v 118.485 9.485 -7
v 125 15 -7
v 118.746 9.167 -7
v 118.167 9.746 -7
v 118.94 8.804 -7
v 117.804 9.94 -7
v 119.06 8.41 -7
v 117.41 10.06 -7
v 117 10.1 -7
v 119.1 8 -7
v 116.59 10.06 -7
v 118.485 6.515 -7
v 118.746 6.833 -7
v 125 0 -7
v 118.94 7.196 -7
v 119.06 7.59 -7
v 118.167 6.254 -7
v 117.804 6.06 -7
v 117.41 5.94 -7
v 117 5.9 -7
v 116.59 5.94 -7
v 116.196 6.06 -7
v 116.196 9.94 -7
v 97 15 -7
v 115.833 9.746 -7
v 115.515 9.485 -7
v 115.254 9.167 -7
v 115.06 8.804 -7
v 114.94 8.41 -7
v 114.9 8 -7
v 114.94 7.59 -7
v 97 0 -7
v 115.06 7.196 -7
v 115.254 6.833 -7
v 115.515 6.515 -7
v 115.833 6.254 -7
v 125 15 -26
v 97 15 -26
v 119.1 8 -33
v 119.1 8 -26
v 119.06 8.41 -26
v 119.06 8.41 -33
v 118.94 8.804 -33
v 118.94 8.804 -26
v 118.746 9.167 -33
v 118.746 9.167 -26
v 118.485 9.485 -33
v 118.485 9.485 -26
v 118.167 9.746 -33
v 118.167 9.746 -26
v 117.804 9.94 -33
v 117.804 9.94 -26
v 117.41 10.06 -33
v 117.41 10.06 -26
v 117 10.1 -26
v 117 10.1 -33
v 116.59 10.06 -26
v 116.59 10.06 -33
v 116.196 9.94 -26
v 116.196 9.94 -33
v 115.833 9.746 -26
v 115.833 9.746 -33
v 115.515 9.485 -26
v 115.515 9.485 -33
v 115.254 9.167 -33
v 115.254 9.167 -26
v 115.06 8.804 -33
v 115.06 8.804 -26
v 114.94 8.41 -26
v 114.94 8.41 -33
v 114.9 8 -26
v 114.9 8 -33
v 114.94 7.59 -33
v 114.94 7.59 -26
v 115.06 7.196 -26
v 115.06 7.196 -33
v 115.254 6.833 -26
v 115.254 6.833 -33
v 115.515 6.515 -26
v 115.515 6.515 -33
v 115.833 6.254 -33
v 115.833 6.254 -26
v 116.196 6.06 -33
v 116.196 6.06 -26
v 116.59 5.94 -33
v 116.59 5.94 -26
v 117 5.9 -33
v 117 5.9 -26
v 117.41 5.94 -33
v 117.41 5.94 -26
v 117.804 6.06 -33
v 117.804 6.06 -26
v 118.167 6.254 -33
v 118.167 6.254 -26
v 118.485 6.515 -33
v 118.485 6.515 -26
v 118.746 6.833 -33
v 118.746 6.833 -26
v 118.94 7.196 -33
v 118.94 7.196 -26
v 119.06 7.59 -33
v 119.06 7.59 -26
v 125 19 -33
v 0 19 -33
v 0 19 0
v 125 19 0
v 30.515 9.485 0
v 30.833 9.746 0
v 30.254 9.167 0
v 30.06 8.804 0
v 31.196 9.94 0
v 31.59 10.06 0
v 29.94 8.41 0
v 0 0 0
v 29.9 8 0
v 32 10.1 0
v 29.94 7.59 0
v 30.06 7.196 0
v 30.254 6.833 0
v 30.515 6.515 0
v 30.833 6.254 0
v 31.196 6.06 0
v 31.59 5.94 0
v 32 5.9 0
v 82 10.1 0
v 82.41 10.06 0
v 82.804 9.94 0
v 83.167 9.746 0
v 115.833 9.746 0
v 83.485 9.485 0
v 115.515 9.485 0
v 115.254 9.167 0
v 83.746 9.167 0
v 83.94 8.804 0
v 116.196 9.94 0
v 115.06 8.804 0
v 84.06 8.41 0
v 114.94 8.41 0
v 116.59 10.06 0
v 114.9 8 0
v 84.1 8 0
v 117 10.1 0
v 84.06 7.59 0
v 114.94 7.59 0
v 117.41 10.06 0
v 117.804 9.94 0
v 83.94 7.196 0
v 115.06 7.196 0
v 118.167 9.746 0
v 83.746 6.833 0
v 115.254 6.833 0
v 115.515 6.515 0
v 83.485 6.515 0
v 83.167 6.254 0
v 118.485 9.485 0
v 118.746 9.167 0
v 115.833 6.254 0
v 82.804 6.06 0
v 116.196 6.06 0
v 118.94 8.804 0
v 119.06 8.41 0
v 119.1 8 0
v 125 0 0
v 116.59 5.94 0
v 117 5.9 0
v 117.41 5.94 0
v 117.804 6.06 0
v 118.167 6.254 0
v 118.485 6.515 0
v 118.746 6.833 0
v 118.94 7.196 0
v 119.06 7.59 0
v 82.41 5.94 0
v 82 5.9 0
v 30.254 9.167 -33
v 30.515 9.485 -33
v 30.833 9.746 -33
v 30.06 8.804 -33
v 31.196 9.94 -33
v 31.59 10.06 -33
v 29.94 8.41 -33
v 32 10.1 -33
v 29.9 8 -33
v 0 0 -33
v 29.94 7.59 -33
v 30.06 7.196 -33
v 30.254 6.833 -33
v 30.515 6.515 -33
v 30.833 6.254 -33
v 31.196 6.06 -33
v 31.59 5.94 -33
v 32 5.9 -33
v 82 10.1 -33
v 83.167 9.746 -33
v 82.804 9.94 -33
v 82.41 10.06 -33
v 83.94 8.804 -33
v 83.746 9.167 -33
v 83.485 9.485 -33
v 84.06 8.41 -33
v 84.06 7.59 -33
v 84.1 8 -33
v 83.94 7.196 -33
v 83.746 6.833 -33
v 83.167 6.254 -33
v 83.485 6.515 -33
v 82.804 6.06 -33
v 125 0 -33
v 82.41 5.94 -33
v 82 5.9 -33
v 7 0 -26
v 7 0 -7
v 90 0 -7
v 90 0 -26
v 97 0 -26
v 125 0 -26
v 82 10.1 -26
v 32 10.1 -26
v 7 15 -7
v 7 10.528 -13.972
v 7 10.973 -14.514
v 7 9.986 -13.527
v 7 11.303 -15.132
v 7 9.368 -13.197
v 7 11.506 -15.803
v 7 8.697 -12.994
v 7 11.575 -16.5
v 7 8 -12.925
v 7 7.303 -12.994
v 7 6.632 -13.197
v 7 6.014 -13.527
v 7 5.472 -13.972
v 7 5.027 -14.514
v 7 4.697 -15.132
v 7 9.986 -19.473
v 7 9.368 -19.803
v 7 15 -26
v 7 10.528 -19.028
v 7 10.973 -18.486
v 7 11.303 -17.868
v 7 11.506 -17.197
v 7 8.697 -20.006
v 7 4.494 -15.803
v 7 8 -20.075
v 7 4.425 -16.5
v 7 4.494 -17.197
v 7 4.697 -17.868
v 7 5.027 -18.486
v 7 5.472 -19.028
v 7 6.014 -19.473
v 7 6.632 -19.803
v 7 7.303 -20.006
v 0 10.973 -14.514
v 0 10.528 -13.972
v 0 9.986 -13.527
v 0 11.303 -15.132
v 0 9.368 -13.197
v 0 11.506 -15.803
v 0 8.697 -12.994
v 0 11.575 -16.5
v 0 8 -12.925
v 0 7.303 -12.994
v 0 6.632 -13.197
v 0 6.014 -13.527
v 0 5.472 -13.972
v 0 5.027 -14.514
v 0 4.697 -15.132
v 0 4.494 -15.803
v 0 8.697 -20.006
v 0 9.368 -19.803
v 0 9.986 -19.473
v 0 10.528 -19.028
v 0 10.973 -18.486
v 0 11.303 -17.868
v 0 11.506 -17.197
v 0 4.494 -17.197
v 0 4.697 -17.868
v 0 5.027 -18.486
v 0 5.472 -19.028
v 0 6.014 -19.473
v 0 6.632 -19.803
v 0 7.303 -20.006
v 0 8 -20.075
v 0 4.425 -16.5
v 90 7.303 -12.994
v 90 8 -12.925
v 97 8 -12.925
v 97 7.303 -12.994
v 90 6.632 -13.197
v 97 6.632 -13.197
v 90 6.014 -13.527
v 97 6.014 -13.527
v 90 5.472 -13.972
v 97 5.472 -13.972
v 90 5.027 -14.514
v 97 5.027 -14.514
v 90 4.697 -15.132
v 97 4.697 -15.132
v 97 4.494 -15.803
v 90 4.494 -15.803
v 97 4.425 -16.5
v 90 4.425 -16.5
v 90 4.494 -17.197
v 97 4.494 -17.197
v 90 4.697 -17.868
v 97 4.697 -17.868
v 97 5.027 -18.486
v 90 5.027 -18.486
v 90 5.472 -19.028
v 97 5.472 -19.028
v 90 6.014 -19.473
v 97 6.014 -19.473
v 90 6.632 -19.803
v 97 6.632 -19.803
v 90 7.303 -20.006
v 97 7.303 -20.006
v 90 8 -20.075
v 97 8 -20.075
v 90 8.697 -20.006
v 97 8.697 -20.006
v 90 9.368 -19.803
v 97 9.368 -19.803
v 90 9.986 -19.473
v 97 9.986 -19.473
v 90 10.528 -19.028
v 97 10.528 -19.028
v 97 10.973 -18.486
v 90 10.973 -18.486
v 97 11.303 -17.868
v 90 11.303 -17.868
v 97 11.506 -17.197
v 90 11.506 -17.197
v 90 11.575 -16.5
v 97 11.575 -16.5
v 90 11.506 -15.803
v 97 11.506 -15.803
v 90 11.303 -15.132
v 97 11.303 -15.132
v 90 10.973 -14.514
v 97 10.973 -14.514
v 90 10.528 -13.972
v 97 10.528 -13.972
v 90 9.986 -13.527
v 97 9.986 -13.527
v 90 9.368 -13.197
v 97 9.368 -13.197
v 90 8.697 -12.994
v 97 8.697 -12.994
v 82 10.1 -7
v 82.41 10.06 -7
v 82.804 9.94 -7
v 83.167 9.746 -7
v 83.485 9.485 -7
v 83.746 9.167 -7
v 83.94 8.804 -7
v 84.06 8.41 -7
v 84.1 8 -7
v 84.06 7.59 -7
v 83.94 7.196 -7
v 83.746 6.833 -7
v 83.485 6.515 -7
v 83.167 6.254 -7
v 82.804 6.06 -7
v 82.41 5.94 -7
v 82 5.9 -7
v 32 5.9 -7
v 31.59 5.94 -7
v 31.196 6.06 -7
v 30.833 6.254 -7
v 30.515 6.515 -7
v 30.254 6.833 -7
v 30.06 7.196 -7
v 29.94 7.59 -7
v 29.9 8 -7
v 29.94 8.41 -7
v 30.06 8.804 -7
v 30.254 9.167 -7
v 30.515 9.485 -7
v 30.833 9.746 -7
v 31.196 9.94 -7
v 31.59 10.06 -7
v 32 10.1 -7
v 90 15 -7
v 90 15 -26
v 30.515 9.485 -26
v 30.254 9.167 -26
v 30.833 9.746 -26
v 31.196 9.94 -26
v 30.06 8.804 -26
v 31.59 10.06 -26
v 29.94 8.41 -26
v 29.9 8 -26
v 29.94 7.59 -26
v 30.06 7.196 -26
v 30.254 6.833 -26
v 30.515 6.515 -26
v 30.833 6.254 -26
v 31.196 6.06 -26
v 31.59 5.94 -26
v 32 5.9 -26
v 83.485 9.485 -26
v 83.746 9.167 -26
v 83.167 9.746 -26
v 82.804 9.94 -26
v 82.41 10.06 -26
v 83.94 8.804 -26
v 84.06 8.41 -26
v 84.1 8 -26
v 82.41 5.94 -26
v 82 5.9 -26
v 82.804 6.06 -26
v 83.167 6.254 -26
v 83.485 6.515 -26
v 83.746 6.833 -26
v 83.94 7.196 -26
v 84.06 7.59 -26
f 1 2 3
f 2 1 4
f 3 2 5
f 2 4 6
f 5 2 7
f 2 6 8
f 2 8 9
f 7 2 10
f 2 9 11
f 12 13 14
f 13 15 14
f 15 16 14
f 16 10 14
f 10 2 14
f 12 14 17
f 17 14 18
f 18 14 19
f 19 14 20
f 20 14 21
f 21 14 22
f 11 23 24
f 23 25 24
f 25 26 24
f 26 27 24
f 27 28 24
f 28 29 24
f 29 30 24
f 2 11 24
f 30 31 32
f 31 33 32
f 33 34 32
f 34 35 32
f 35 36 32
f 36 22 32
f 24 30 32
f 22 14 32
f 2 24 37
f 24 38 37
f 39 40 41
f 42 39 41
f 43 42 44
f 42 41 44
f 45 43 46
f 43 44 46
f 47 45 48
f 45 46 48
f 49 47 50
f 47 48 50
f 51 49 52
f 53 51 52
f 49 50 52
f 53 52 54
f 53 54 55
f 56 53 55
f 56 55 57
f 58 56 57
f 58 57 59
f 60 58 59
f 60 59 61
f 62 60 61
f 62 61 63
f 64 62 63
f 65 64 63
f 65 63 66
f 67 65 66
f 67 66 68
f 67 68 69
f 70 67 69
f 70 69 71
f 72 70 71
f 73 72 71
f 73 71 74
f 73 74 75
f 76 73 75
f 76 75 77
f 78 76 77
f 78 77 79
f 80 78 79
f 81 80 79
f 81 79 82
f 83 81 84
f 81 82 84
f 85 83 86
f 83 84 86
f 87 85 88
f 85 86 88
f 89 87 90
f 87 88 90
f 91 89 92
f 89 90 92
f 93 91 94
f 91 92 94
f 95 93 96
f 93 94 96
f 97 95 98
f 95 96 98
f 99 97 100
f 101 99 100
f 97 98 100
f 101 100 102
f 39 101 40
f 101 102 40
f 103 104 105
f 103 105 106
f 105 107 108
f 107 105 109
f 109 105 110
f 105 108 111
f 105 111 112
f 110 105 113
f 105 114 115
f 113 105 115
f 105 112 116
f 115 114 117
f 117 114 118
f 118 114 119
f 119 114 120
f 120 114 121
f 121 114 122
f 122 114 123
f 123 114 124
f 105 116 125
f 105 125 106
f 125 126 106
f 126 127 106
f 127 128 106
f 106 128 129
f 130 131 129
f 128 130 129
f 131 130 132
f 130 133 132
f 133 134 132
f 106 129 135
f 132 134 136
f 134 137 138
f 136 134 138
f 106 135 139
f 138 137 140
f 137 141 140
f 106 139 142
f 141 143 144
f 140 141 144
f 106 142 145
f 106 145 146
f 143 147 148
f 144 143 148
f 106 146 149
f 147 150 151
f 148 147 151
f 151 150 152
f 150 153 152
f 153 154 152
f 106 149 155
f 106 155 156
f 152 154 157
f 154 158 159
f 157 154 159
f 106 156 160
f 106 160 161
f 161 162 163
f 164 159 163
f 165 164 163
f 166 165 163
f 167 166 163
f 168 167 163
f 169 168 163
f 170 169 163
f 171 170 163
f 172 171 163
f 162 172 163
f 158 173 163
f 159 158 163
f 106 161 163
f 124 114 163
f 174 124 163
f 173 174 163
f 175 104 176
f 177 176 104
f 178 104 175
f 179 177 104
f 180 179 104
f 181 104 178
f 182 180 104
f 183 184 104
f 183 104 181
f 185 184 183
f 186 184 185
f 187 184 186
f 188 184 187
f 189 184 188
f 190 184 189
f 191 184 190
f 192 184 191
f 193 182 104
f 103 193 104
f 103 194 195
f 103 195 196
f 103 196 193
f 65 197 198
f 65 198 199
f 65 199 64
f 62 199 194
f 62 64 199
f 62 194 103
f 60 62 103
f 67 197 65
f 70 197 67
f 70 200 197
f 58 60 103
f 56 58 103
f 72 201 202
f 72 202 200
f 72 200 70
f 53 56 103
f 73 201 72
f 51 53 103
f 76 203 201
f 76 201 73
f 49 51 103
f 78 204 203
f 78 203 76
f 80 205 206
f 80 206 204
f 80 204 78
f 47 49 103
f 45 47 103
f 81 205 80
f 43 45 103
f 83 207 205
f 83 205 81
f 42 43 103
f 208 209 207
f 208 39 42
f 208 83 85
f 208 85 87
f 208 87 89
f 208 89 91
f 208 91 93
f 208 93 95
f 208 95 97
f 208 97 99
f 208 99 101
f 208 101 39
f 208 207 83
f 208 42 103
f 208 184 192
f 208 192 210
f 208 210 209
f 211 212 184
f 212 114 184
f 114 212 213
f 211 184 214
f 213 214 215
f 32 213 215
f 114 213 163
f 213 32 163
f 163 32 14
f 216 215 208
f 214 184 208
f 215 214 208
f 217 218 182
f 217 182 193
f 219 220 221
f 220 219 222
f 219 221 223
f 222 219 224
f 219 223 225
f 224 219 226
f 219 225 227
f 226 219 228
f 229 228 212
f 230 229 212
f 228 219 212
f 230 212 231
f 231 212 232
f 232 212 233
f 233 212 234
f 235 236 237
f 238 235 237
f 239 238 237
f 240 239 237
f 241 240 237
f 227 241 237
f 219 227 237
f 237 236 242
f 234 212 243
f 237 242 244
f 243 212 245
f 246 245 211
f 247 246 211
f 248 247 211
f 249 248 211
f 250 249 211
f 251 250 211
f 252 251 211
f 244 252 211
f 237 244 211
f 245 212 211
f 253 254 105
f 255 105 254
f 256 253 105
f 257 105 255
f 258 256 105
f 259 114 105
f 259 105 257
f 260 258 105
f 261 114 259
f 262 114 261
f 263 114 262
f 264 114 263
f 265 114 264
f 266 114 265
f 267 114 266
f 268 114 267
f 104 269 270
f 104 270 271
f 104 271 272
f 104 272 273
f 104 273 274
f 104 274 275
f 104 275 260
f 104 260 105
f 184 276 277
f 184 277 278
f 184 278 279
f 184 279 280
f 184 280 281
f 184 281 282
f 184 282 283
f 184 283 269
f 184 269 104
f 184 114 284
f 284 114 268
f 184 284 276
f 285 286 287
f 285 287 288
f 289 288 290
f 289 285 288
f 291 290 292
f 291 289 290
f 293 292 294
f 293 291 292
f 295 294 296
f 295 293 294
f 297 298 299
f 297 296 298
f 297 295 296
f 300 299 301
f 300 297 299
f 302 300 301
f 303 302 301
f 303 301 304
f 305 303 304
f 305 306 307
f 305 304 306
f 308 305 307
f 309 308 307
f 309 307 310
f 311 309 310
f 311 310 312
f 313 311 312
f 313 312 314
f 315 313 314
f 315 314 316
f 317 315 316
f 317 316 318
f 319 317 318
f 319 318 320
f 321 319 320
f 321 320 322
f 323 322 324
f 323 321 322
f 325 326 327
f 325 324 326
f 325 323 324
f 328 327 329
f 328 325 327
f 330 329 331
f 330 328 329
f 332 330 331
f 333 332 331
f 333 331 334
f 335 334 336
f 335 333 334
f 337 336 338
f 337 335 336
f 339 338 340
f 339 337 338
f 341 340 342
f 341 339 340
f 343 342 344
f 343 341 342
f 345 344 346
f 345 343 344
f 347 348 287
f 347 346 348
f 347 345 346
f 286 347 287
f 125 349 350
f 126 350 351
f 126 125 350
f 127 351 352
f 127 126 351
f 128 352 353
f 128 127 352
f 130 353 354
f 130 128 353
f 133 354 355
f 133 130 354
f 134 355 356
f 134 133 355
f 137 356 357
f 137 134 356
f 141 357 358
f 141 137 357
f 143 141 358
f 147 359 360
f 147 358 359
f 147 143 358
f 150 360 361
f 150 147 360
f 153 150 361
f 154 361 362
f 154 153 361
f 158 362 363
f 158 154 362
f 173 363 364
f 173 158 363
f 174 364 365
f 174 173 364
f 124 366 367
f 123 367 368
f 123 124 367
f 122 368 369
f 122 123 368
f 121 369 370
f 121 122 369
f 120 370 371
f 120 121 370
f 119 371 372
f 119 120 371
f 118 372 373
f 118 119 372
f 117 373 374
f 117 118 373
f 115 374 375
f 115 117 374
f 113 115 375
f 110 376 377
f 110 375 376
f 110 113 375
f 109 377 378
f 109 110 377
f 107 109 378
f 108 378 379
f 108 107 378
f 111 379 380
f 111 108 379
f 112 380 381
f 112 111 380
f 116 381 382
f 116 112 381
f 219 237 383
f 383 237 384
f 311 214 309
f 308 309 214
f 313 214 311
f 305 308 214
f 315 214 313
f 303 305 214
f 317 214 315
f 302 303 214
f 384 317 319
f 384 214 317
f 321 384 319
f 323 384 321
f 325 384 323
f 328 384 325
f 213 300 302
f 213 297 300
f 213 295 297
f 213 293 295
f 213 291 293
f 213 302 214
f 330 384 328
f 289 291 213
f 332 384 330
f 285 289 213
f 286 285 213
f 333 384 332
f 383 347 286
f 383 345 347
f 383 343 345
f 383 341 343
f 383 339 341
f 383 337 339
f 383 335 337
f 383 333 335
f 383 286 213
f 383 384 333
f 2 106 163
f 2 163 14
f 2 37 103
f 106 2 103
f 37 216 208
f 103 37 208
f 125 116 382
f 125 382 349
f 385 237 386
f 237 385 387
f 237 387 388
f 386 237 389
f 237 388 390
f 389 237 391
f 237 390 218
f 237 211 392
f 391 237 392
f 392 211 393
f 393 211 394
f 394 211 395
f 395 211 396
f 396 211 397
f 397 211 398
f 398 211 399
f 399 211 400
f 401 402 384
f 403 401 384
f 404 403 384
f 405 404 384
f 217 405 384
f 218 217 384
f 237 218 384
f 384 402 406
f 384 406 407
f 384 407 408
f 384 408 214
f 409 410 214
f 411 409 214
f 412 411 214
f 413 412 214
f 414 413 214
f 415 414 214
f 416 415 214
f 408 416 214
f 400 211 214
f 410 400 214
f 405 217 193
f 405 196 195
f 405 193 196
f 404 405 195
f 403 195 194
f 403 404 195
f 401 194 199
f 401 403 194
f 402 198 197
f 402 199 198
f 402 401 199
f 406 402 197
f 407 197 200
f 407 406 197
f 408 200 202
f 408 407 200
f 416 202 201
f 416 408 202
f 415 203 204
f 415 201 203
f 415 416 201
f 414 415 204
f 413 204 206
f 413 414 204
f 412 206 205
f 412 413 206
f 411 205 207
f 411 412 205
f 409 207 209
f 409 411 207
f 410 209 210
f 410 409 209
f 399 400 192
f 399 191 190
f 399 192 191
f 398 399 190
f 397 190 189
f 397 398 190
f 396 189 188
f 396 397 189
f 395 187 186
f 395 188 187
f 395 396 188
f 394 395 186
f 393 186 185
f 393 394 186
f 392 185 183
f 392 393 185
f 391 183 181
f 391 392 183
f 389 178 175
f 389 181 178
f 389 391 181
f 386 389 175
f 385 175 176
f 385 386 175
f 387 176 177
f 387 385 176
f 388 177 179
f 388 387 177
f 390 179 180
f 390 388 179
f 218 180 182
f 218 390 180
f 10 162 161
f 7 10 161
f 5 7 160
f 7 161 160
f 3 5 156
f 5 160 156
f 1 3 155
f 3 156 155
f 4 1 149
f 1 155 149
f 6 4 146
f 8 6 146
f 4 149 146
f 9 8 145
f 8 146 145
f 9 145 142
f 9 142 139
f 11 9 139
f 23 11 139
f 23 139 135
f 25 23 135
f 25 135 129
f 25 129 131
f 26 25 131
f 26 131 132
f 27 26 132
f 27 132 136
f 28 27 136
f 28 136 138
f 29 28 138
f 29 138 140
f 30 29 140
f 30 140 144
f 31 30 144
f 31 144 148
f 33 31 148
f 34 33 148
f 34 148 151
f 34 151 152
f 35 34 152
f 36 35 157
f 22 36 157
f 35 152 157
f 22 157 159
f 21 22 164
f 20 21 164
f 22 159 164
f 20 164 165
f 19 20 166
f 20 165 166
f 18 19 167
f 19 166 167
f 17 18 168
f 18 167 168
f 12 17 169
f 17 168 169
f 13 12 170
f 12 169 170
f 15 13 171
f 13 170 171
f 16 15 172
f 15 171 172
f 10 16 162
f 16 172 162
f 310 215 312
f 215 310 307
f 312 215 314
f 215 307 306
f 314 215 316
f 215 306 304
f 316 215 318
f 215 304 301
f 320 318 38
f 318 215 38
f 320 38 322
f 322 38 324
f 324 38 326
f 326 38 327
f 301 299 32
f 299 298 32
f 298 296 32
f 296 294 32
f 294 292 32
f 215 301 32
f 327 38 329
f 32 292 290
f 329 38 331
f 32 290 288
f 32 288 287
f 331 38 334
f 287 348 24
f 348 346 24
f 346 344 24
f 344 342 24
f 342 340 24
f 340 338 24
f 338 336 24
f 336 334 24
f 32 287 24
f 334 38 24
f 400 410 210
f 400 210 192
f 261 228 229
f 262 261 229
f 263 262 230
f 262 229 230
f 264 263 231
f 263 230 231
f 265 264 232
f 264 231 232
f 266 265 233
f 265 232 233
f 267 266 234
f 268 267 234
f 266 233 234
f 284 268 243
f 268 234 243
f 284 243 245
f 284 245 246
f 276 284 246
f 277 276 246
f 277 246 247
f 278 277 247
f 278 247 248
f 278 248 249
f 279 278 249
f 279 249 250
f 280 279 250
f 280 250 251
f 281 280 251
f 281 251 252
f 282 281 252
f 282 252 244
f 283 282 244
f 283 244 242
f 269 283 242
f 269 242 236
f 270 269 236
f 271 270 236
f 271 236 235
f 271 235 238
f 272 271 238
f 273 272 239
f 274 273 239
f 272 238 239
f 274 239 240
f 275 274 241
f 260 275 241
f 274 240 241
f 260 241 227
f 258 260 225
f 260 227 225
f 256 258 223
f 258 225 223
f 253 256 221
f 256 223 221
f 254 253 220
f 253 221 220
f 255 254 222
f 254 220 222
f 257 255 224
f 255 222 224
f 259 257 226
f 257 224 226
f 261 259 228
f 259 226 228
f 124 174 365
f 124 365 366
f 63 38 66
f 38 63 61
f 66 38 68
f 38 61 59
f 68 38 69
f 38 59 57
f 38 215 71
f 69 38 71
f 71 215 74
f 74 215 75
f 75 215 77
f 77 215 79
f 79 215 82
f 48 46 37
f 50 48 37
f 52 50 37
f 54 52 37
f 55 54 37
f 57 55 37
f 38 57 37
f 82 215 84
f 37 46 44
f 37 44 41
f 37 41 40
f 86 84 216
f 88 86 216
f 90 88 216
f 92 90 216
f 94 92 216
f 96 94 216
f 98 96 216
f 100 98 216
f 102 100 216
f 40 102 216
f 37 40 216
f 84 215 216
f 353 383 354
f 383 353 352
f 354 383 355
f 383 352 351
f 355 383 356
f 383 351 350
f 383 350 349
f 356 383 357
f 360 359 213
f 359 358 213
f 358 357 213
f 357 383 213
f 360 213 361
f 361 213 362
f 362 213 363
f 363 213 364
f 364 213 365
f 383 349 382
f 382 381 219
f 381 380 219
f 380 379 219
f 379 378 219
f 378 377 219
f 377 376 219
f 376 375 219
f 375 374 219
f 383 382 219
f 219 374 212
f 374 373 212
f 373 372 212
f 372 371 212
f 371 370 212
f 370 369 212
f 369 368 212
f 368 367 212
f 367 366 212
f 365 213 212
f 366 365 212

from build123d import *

# Parameters (mm, degrees)
BOSS_EXTRUDE1_DEPTH            = 15
SKETCH3_R                      = 2.1
CUT_EXTRUDE2_DEPTH             = 131.149913561
SKETCH2_W                      = 125
SKETCH2_H                      = 33
BOSS_EXTRUDE4_DEPTH            = 4
SKETCH8_W                      = 7
SKETCH8_H                      = 19
BOSS_EXTRUDE5_DEPTH            = 15
CUT_EXTRUDE4_REACH             = 125.992
SKETCH6_R                      = 3.575
CUT_EXTRUDE4_DIRECTION_2_DEPTH = 124.991935222


with BuildPart() as part:
    # Sketch1 → Boss-Extrude1 (new body)
    with BuildSketch(Plane(origin=(0, 0, 0), x_dir=(1, 0, 0), z_dir=(0, 1, 0))):
        Polygon((125, 26), (125, 33), (0, 33), (0, 0), (125, 0), (125, 7), (7, 7), (7, 26), align=None)
    extrude(amount=BOSS_EXTRUDE1_DEPTH)

    # Sketch3 → Cut-Extrude2 (cut, through all)
    with BuildSketch(Plane.XY):
        with Locations((117, 8)):
            Circle(SKETCH3_R)
        with BuildLine():
            Line((82, 5.9), (32, 5.9))
            ThreePointArc((32, 5.9), (29.9, 8), (32, 10.1))
            Line((32, 10.1), (82, 10.1))
            ThreePointArc((82, 10.1), (84.1, 8), (82, 5.9))
        make_face()
    extrude(amount=-CUT_EXTRUDE2_DEPTH, mode=Mode.SUBTRACT)

    # Sketch2 → Boss-Extrude4 (add)
    with BuildSketch(Plane(origin=(0, 15, 0), x_dir=(1, 0, 0), z_dir=(0, 1, 0))):
        with Locations((62.5, 16.5)):
            Rectangle(SKETCH2_W, SKETCH2_H)
    extrude(amount=BOSS_EXTRUDE4_DEPTH)

    # Sketch8 → Boss-Extrude5 (add)
    with BuildSketch(Plane.XZ.offset(-15)):
        with Locations((93.5, -16.5)):
            Rectangle(SKETCH8_W, SKETCH8_H)
    extrude(amount=BOSS_EXTRUDE5_DEPTH)

    # Cut-Extrude4: up to this face of the body (flat: up to its plane)
    cut_extrude4_end = Plane(part.part.faces().sort_by_distance((97, 7.5, -16.5))[0])
    # Sketch6 → Cut-Extrude4 (cut, up to the picked face)
    with BuildSketch(Plane(origin=(7, 0, 0), x_dir=(0, 0, -1), z_dir=(1, 0, 0)), mode=Mode.PRIVATE) as cut_extrude4_sk1:
        with Locations(Location((16.5, 8, 0), (0, 0, 180))):
            Circle(SKETCH6_R)
    cut_extrude4_tool1 = split(extrude(cut_extrude4_sk1.sketch, amount=CUT_EXTRUDE4_REACH, mode=Mode.PRIVATE), bisect_by=cut_extrude4_end, keep=Keep.BOTH, mode=Mode.PRIVATE)
    add(cut_extrude4_tool1.solids().sort_by(Axis((7, 8, -16.5), (1, 0, 0)))[0], mode=Mode.SUBTRACT)

    # Sketch6 → Cut-Extrude4 direction 2 (cut)
    with BuildSketch(Plane(origin=(7, 0, 0), x_dir=(0, 0, -1), z_dir=(1, 0, 0))):
        with Locations(Location((16.5, 8, 0), (0, 0, 180))):
            Circle(SKETCH6_R)
    extrude(amount=-CUT_EXTRUDE4_DIRECTION_2_DEPTH, mode=Mode.SUBTRACT)


solid = part.part
